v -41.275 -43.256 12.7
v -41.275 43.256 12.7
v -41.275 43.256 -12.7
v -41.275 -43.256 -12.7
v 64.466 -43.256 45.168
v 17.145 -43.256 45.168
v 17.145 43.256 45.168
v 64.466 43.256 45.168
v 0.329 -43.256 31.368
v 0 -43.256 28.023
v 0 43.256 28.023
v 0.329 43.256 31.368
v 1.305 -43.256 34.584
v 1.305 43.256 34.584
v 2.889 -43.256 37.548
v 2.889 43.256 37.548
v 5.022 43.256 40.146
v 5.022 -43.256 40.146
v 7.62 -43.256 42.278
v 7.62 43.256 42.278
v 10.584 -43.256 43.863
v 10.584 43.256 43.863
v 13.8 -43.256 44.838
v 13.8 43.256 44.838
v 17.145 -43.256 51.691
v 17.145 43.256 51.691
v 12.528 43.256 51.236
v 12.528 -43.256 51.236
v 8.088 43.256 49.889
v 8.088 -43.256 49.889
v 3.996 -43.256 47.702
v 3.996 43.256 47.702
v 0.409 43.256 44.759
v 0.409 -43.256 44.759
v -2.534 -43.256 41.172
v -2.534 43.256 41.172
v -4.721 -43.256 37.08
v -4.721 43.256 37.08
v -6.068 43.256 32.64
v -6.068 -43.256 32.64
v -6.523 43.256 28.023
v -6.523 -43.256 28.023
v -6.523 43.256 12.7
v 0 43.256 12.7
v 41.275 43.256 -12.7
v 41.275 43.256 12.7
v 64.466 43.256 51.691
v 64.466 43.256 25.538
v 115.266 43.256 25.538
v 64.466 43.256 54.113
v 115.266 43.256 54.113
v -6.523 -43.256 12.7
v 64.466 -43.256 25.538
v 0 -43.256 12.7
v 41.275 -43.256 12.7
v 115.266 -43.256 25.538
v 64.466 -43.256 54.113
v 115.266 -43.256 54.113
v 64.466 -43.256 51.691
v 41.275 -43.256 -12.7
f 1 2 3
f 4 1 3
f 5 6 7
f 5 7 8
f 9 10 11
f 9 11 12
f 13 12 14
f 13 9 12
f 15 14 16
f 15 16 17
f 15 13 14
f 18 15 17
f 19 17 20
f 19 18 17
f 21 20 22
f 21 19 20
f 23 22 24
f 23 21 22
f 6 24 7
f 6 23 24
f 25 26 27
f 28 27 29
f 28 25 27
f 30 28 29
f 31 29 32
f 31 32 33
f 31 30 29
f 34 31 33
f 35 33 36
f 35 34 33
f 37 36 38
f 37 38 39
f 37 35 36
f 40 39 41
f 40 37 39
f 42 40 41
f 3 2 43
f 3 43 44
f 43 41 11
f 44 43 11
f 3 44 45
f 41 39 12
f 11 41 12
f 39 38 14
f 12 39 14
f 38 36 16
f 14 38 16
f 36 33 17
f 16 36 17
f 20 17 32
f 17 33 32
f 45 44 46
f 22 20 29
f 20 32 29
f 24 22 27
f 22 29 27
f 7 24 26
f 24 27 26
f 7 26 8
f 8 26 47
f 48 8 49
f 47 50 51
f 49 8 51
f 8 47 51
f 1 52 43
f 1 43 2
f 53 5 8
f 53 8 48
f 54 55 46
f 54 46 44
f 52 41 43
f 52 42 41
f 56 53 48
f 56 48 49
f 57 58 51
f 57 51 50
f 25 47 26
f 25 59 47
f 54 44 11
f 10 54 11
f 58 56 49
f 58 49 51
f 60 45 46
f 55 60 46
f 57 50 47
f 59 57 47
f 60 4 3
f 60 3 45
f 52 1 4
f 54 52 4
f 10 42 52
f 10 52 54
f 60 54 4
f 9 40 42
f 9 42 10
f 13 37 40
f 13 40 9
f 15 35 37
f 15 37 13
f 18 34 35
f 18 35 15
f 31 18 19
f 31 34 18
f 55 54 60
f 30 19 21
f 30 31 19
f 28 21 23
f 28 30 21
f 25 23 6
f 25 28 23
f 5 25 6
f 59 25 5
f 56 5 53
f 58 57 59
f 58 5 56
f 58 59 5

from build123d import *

# Parameters (mm, degrees)
F1_DEPTH = 43.25595


with BuildPart() as f1:
    # F0 (on Front) → F1 (new body, symmetric)
    with BuildSketch(Plane.XZ):
        with BuildLine():
            Line((-6.523012, 28.022824), (-6.523012, 12.7))
            Line((-6.523012, 12.7), (0, 12.7))
            Line((0, 12.7), (0, 28.022824))
            ThreePointArc((0, 28.022824), (5.021654, 40.14617), (17.145, 45.167824))
            Line((17.145, 45.167824), (64.466302, 45.167824))
            Line((64.466302, 45.167824), (64.466302, 51.690836))
            Line((64.466302, 51.690836), (17.145, 51.690836))
            ThreePointArc((17.145, 51.690836), (0.409188, 44.758636), (-6.523012, 28.022824))
        make_face()
        Polygon((-6.523012, 12.7), (-41.275, 12.7), (-41.275, -12.7), (41.275, -12.7), (41.275, 12.7), (0, 12.7), align=None)
        Polygon((64.466302, 54.113042), (64.466302, 51.690836), (64.466302, 45.167824), (64.466302, 25.538042), (115.266302, 25.538042), (115.266302, 54.113042), align=None)
    extrude(amount=F1_DEPTH, both=True)


solid = f1.part
